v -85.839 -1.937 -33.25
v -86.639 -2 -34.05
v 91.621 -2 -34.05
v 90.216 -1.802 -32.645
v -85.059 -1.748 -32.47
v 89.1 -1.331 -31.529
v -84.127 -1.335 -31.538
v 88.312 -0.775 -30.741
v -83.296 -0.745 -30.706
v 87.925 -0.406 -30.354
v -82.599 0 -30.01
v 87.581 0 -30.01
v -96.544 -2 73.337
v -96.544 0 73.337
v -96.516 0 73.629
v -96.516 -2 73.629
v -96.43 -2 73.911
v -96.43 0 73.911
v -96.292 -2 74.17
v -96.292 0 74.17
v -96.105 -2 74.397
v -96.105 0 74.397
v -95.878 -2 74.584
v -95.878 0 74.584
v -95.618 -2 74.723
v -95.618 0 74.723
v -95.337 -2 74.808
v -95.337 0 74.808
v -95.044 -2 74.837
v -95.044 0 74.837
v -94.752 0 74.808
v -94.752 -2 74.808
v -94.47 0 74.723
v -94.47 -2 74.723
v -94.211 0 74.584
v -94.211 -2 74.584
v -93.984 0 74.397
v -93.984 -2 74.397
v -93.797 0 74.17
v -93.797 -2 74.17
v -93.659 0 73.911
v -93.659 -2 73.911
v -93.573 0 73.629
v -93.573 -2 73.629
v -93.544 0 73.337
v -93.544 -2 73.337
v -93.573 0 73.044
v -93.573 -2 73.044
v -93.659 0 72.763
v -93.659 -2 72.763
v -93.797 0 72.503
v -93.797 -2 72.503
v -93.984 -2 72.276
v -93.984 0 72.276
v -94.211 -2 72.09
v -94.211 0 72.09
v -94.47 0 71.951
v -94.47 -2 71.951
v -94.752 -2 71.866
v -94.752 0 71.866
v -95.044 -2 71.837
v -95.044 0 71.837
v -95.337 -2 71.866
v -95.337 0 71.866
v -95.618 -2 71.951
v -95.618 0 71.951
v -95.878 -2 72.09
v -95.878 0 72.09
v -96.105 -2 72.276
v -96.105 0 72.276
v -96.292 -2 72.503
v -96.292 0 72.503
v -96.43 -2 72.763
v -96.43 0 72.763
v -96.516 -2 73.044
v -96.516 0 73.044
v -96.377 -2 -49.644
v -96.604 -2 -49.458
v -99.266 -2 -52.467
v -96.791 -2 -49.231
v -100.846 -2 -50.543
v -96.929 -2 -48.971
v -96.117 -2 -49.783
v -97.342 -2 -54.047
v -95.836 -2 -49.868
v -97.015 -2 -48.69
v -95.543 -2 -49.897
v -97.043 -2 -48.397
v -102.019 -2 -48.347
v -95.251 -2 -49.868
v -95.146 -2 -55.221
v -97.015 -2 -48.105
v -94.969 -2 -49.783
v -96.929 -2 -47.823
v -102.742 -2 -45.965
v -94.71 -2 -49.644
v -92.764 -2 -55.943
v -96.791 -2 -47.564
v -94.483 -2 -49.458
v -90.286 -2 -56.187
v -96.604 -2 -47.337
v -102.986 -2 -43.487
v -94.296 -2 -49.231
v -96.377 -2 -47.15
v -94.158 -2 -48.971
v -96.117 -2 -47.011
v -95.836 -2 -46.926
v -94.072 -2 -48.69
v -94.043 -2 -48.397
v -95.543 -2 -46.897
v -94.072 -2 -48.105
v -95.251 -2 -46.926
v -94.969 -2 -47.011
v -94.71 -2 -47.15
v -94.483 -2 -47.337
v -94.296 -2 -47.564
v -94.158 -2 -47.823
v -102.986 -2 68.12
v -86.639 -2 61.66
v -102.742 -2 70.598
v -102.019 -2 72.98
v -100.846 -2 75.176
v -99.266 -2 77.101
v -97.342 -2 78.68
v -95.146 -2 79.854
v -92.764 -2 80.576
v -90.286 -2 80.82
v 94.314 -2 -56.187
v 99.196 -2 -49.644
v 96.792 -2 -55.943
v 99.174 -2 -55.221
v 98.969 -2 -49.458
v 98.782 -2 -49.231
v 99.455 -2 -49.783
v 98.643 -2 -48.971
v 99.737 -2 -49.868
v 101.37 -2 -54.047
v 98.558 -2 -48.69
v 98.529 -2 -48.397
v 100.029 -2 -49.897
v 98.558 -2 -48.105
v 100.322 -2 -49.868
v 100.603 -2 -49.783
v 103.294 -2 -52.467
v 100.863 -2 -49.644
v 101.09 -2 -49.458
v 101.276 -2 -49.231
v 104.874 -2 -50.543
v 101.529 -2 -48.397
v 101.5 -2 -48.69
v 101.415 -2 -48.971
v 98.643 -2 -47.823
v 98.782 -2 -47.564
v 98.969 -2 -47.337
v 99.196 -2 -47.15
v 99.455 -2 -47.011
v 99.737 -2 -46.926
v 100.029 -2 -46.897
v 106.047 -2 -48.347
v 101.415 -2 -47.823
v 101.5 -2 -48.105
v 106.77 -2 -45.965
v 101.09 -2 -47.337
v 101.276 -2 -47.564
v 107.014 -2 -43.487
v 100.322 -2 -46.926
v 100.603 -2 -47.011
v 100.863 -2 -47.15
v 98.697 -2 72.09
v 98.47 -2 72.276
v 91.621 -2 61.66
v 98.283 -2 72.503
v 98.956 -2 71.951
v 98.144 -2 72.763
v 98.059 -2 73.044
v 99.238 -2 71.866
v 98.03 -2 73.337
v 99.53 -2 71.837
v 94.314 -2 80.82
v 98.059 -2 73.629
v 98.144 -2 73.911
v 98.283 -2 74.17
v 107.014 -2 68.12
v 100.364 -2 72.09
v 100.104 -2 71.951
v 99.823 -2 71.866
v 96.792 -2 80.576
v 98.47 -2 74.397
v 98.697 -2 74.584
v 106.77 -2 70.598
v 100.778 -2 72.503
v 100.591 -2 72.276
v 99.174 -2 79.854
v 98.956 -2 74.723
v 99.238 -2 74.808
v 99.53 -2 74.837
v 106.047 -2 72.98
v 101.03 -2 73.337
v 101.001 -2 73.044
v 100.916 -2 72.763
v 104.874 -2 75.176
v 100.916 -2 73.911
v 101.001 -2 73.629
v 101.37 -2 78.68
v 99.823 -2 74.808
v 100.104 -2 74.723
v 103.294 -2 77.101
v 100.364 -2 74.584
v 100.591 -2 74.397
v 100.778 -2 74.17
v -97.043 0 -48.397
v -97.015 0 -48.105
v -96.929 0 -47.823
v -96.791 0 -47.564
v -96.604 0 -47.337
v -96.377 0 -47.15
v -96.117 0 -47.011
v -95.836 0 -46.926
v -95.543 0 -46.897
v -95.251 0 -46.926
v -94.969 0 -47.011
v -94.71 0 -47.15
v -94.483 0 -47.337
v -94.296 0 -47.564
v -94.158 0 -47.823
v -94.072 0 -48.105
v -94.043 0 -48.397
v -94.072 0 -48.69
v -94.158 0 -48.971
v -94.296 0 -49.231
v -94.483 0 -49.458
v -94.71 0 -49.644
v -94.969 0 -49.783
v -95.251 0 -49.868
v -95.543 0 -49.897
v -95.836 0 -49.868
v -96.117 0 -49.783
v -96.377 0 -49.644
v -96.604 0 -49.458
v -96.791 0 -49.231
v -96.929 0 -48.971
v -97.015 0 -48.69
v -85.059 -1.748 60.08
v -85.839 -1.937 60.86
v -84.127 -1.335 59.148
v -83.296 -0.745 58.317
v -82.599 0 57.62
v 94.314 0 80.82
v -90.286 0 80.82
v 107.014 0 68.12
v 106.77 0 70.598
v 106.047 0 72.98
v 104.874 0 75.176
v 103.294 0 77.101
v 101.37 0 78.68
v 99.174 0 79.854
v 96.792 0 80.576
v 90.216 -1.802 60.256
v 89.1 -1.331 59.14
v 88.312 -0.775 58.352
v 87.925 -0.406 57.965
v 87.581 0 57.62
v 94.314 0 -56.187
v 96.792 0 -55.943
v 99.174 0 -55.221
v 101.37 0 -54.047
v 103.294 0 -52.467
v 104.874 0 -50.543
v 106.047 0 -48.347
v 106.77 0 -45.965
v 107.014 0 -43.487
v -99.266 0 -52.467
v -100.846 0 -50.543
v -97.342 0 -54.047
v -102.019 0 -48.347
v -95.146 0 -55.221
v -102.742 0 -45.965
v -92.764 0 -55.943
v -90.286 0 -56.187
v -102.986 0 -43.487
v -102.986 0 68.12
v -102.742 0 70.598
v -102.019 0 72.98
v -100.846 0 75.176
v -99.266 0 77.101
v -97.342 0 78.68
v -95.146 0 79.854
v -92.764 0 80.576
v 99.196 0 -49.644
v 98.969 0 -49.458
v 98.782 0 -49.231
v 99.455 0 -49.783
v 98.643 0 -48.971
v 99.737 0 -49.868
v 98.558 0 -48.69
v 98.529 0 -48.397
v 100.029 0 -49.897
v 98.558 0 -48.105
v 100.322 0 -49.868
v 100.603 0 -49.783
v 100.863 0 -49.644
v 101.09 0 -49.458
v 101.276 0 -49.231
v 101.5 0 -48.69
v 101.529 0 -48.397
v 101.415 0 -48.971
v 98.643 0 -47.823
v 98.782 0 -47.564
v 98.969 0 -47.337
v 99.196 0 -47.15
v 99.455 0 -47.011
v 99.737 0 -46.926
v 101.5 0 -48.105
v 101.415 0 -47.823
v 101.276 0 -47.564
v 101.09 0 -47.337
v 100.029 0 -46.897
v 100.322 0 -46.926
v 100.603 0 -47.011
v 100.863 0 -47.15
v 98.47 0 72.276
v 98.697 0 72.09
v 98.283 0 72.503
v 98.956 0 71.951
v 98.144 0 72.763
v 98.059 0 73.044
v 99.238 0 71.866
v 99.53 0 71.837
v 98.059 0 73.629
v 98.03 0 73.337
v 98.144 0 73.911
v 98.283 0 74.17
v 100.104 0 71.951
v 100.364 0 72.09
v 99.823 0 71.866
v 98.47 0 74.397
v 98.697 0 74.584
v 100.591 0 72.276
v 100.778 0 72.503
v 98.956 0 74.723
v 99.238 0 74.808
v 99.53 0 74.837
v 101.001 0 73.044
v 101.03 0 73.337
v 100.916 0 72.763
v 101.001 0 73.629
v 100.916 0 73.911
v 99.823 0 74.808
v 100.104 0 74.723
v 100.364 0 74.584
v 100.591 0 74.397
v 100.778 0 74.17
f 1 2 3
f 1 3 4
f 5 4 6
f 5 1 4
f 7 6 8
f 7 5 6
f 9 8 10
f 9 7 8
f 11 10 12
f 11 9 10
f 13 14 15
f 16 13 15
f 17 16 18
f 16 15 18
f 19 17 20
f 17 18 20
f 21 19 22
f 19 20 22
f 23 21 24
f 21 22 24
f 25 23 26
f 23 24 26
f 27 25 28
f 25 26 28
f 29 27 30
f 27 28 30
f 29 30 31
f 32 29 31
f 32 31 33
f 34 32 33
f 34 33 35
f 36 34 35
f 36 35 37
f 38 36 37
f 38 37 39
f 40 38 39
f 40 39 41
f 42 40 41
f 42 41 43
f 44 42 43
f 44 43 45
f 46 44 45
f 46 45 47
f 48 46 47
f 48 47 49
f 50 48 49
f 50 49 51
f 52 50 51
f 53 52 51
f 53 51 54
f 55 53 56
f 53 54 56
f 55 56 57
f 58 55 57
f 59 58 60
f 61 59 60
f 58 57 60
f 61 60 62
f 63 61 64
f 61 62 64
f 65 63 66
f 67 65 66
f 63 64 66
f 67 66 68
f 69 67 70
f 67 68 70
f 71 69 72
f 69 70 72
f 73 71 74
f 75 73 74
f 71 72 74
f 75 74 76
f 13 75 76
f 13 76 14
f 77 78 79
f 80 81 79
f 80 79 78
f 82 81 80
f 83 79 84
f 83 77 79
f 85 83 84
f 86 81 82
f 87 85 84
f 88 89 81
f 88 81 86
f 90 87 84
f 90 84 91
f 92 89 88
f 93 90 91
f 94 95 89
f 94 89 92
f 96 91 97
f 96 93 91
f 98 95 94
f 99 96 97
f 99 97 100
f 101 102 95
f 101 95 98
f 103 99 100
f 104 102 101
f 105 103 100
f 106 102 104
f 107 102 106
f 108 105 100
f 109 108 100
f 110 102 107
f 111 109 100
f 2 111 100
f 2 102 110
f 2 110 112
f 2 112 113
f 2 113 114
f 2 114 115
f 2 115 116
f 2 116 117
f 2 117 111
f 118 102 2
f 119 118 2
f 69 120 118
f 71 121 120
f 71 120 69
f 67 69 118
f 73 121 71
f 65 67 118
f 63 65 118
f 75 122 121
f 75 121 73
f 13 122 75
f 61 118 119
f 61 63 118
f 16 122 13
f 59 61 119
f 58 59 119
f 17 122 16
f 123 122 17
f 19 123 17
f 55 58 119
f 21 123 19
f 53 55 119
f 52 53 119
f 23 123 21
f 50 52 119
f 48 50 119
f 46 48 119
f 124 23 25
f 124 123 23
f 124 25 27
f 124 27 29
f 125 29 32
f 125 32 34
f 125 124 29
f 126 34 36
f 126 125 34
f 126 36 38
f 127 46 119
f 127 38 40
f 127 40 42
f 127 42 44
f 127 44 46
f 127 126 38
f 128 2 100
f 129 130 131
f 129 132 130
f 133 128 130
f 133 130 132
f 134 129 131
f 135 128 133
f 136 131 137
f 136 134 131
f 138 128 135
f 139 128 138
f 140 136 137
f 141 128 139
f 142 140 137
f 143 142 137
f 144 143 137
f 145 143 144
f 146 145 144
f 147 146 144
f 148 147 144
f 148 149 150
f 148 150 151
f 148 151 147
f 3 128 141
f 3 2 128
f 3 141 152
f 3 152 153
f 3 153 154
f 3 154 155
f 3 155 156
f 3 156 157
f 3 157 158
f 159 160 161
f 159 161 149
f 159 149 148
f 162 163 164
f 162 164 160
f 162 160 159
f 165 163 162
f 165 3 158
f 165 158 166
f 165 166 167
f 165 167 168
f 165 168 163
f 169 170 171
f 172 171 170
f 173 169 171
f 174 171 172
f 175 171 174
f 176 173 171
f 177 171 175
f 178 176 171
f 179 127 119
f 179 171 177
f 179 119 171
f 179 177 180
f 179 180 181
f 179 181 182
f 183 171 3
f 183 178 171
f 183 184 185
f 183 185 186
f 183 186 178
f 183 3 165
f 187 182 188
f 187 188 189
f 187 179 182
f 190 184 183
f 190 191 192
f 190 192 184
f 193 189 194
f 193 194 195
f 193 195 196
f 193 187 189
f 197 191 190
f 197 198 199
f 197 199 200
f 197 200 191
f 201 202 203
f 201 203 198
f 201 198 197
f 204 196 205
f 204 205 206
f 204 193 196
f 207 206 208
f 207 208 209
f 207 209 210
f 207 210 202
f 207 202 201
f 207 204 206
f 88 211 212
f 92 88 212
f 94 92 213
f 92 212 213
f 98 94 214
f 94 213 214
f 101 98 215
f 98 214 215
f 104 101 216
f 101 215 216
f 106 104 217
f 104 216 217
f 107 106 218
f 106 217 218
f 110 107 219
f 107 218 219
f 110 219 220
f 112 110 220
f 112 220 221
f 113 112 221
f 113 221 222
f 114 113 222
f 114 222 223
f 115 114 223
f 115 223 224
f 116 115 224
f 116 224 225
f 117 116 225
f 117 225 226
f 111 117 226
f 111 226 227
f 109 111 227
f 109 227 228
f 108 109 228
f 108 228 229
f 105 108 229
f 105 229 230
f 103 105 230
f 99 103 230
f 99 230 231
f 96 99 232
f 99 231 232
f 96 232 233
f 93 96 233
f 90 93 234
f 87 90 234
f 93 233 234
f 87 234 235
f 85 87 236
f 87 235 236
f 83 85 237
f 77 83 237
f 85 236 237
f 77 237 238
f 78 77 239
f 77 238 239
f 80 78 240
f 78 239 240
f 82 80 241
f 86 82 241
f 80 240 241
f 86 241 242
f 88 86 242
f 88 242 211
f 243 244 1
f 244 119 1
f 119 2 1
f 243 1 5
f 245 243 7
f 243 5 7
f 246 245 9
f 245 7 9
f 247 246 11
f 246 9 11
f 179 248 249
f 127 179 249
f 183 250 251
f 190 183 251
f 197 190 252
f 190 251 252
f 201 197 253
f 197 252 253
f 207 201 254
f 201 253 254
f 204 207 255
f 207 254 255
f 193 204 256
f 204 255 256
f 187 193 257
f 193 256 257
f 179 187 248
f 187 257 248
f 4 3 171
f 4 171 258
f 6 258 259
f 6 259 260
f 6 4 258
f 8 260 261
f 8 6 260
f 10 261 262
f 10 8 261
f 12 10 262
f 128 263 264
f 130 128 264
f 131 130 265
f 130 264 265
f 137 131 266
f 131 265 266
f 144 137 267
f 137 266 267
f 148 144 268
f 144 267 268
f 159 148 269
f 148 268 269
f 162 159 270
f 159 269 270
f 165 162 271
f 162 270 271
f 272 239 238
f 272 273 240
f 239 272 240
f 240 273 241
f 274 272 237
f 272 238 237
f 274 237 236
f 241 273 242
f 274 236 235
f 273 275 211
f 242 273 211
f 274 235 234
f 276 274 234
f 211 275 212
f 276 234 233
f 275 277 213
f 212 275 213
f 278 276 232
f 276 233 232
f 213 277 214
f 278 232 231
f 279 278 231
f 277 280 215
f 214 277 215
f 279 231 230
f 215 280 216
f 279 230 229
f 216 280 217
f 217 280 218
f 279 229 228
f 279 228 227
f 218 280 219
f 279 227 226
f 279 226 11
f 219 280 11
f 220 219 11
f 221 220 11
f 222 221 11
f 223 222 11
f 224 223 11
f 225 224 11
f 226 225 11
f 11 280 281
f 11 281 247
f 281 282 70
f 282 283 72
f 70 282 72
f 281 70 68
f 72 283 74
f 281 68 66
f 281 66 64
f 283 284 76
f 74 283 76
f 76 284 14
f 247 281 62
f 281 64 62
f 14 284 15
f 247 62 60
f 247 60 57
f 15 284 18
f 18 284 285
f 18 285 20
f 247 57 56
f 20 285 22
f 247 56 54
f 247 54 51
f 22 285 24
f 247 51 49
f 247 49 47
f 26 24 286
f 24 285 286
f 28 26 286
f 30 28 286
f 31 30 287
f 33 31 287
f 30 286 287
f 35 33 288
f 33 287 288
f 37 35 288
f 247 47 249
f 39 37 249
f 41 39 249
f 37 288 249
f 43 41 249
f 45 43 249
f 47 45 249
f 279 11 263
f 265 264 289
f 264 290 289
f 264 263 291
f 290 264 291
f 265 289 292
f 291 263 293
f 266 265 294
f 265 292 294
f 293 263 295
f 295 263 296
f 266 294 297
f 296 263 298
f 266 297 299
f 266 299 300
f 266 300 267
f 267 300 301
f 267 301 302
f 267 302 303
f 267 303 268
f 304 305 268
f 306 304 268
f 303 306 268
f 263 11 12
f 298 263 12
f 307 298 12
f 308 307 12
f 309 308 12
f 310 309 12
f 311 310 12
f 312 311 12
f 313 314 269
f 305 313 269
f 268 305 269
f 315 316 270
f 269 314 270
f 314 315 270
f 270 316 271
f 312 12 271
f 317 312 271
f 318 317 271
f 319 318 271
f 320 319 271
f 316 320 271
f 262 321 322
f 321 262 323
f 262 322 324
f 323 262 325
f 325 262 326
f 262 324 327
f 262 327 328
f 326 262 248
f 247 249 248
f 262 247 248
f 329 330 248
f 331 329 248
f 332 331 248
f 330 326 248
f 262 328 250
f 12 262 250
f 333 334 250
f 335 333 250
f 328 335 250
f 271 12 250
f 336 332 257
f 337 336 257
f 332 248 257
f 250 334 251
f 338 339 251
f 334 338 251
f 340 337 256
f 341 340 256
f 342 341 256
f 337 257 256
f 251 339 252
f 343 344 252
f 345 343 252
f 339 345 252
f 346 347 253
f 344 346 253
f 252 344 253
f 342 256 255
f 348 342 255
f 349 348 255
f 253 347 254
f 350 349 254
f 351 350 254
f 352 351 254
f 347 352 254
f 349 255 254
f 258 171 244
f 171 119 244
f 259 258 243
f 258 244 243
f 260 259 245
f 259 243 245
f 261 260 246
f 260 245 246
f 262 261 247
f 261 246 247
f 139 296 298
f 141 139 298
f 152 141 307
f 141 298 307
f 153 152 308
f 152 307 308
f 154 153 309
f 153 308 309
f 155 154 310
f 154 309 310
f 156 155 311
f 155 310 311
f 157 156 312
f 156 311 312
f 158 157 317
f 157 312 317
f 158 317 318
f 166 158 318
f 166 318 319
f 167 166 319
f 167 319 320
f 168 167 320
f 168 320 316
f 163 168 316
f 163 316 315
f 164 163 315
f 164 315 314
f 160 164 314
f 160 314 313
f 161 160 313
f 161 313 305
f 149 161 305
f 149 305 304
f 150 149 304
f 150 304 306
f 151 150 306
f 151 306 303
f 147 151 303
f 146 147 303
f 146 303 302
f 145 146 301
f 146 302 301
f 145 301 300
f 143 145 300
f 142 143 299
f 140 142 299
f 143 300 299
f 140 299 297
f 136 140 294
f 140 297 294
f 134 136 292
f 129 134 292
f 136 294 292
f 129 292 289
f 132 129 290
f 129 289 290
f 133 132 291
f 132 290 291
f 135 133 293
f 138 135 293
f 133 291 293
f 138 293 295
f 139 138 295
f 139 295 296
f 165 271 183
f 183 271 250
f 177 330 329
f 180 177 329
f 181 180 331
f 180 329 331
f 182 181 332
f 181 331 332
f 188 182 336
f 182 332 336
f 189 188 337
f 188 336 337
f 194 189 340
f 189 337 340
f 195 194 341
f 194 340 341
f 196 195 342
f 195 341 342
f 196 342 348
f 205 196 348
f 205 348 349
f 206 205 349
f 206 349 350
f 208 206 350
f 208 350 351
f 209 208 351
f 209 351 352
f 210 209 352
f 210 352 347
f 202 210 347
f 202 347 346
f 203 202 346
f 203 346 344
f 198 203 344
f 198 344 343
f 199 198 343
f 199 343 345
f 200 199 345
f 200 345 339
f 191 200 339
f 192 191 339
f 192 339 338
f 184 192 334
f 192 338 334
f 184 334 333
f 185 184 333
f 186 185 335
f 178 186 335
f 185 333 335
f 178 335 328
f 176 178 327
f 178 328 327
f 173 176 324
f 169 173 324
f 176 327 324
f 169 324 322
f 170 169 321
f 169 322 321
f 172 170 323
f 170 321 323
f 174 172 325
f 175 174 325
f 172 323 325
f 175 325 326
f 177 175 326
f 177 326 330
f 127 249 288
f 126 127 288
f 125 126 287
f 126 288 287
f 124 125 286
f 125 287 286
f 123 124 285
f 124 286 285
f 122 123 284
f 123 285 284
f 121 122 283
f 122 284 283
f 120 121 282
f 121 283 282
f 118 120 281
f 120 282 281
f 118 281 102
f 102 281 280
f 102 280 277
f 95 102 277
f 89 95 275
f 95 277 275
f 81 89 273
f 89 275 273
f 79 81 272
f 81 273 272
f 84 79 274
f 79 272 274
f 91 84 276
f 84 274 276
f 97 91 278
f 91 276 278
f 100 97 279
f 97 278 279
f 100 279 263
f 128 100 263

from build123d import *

# Parameters (mm, degrees)
F0_W         = 170.18
F0_H         = 87.63
F1_DEPTH     = 2
F3_D         = 3
F4_T1_DEPTH  = 87.63
F4_T3_DEPTH  = 170.18
F4_T9_DEPTH  = 97.7295049384
F4_T13_DEPTH = 180.2795049384
F4_T20_DEPTH = 97.7295049384
F4_T24_DEPTH = 180.2795049384
F4_T31_DEPTH = 180.2795049384
F4_T35_DEPTH = 97.7295049384
F4_T42_DEPTH = 180.2795049384
F4_T46_DEPTH = 97.7295049384


# Not quite as in the source:
# - a fillet or chamfer that OpenCascade refuses, or shapes differently, is made with other operations: its cross-section is extruded or revolved along the edge and cut away or added


with BuildPart() as f1:
    # F0 (on Front) → F1 (new body)
    with BuildSketch(Plane.XZ):
        with BuildLine():
            Line((94.3139557123, 80.8203592896), (-90.2860442877, 80.8203592896))
            ThreePointArc((-90.2860442877, 80.8203592896), (-99.2663004088, 77.1006154107), (-102.9860442877, 68.1203592896))
            Line((-102.9860442877, 68.1203592896), (-102.9860442877, -43.4872407104))
            ThreePointArc((-102.9860442877, -43.4872407104), (-99.2663004088, -52.4674968314), (-90.2860442877, -56.1872407104))
            Line((-90.2860442877, -56.1872407104), (94.3139557123, -56.1872407104))
            ThreePointArc((94.3139557123, -56.1872407104), (103.2942118334, -52.4674968314), (107.0139557123, -43.4872407104))
            Line((107.0139557123, -43.4872407104), (107.0139557123, 68.1203592896))
            ThreePointArc((107.0139557123, 68.1203592896), (103.2942118334, 77.1006154107), (94.3139557123, 80.8203592896))
        make_face()
        with Locations((2.4907932702, 13.8051814874)):
            Rectangle(F0_W, F0_H, mode=Mode.SUBTRACT)
    extrude(amount=F1_DEPTH)

    # F3 (through all)
    with Locations(Plane.XZ.offset(2)):
        with Locations((-95.5433249474, -48.3972094953), (-95.0444117188, 73.3367204666), (100.0292077661, -48.3972094953), (99.5303019881, 73.3367204666)):
            Hole(F3_D / 2)

    # F4: fillet of radius 5.08 on 4 edges, made by hand

    # F4_s2 → F4_t1 (cut)
    with BuildSketch(Plane.XY.offset(-30.0098185126)):
        with BuildLine():
            ThreePointArc((91.6205952456, -2), (89.3667097117, -1.4726256161), (87.5807932702, 0))
            Line((87.5807932702, 0), (87.5807932702, -2))
            Line((87.5807932702, -2), (91.6205952456, -2))
        make_face()
        with BuildLine():
            ThreePointArc((-86.6390087051, -2), (-84.3851231712, -1.4726256161), (-82.5992067298, 0))
            Line((-82.5992067298, 0), (-82.5992067298, -2))
            Line((-82.5992067298, -2), (-86.6390087051, -2))
        make_face()
    extrude(amount=F4_T1_DEPTH, mode=Mode.SUBTRACT)

    # F4_s4 → F4_t3 (cut)
    with BuildSketch(Plane.YZ.offset(-82.5992067298)):
        with BuildLine():
            ThreePointArc((-2, 61.6599834627), (-1.4726256161, 59.4060979288), (0, 57.6201814874))
            Line((0, 57.6201814874), (-2, 57.6201814874))
            Line((-2, 57.6201814874), (-2, 61.6599834627))
        make_face()
        with BuildLine():
            ThreePointArc((-2, -34.049620488), (-1.4726256161, -31.795734954), (0, -30.0098185126))
            Line((0, -30.0098185126), (-2, -30.0098185126))
            Line((-2, -30.0098185126), (-2, -34.049620488))
        make_face()
    extrude(amount=F4_T3_DEPTH, mode=Mode.SUBTRACT)


with BuildPart() as f4_tool7:
    # F4_s8 → F4_t9 (new body)
    with BuildSketch(Plane.XY.offset(67.7196864257)):
        with BuildLine():
            ThreePointArc((91.6205952456, -2), (89.3667097117, -1.4726256161), (87.5807932702, 0))
            Line((87.5807932702, 0), (87.5807932702, -2))
            Line((87.5807932702, -2), (91.6205952456, -2))
        make_face()
    extrude(amount=-F4_T9_DEPTH)

    split(bisect_by=Plane.XY.offset(57.6201814874), keep=Keep.TOP)


with BuildPart() as f4_tool11:
    # F4_s12 → F4_t13 (new body)
    with BuildSketch(Plane.YZ.offset(-82.5992067298)):
        with BuildLine():
            ThreePointArc((-2, 61.6599834627), (-1.4726256161, 59.4060979288), (0, 57.6201814874))
            Line((0, 57.6201814874), (-2, 57.6201814874))
            Line((-2, 57.6201814874), (-2, 61.6599834627))
        make_face()
    extrude(amount=F4_T13_DEPTH)

    split(bisect_by=Plane.YZ.offset(87.5807932702), keep=Keep.TOP)


with BuildPart() as f4_tool7_1:
    add(f4_tool7.part)

    # F4_t15: intersect F4_tool11
    add(f4_tool11.part, mode=Mode.INTERSECT)


with BuildPart() as f1_1:
    add(f1.part)

    # F4_t5: cut F4_tool7
    add(f4_tool7_1.part, mode=Mode.SUBTRACT)


with BuildPart() as f4_tool18:
    # F4_s19 → F4_t20 (new body)
    with BuildSketch(Plane.XY.offset(57.6201814874)):
        with BuildLine():
            ThreePointArc((91.6205952456, -2), (89.3667097117, -1.4726256161), (87.5807932702, 0))
            Line((87.5807932702, 0), (87.5807932702, -2))
            Line((87.5807932702, -2), (91.6205952456, -2))
        make_face()
    extrude(amount=-F4_T20_DEPTH)

    split(bisect_by=Plane.XY.offset(-30.0098185126), keep=Keep.BOTTOM)


with BuildPart() as f4_tool22:
    # F4_s23 → F4_t24 (new body)
    with BuildSketch(Plane.YZ.offset(97.6802982086)):
        with BuildLine():
            ThreePointArc((-2, -34.049620488), (-1.4726256161, -31.795734954), (0, -30.0098185126))
            Line((0, -30.0098185126), (-2, -30.0098185126))
            Line((-2, -30.0098185126), (-2, -34.049620488))
        make_face()
    extrude(amount=-F4_T24_DEPTH)

    split(bisect_by=Plane.YZ.offset(87.5807932702), keep=Keep.TOP)


with BuildPart() as f4_tool18_1:
    add(f4_tool18.part)

    # F4_t26: intersect F4_tool22
    add(f4_tool22.part, mode=Mode.INTERSECT)


with BuildPart() as f1_2:
    add(f1_1.part)

    # F4_t16: cut F4_tool18
    add(f4_tool18_1.part, mode=Mode.SUBTRACT)


with BuildPart() as f4_tool29:
    # F4_s30 → F4_t31 (new body)
    with BuildSketch(Plane.YZ.offset(-92.6987116681)):
        with BuildLine():
            ThreePointArc((-2, 61.6599834627), (-1.4726256161, 59.4060979288), (0, 57.6201814874))
            Line((0, 57.6201814874), (-2, 57.6201814874))
            Line((-2, 57.6201814874), (-2, 61.6599834627))
        make_face()
    extrude(amount=F4_T31_DEPTH)

    split(bisect_by=Plane.YZ.offset(-82.5992067298), keep=Keep.BOTTOM)


with BuildPart() as f4_tool33:
    # F4_s34 → F4_t35 (new body)
    with BuildSketch(Plane.XY.offset(-30.0098185126)):
        with BuildLine():
            ThreePointArc((-86.6390087051, -2), (-84.3851231712, -1.4726256161), (-82.5992067298, 0))
            Line((-82.5992067298, 0), (-82.5992067298, -2))
            Line((-82.5992067298, -2), (-86.6390087051, -2))
        make_face()
    extrude(amount=F4_T35_DEPTH)

    split(bisect_by=Plane.XY.offset(57.6201814874), keep=Keep.TOP)


with BuildPart() as f4_tool29_1:
    add(f4_tool29.part)

    # F4_t37: intersect F4_tool33
    add(f4_tool33.part, mode=Mode.INTERSECT)


with BuildPart() as f1_3:
    add(f1_2.part)

    # F4_t27: cut F4_tool29
    add(f4_tool29_1.part, mode=Mode.SUBTRACT)


with BuildPart() as f4_tool40:
    # F4_s41 → F4_t42 (new body)
    with BuildSketch(Plane.YZ.offset(87.5807932702)):
        with BuildLine():
            ThreePointArc((-2, -34.049620488), (-1.4726256161, -31.795734954), (0, -30.0098185126))
            Line((0, -30.0098185126), (-2, -30.0098185126))
            Line((-2, -30.0098185126), (-2, -34.049620488))
        make_face()
    extrude(amount=-F4_T42_DEPTH)

    split(bisect_by=Plane.YZ.offset(-82.5992067298), keep=Keep.BOTTOM)


with BuildPart() as f4_tool44:
    # F4_s45 → F4_t46 (new body)
    with BuildSketch(Plane.XY.offset(-40.109323451)):
        with BuildLine():
            ThreePointArc((-86.6390087051, -2), (-84.3851231712, -1.4726256161), (-82.5992067298, 0))
            Line((-82.5992067298, 0), (-82.5992067298, -2))
            Line((-82.5992067298, -2), (-86.6390087051, -2))
        make_face()
    extrude(amount=F4_T46_DEPTH)

    split(bisect_by=Plane.XY.offset(-30.0098185126), keep=Keep.BOTTOM)


with BuildPart() as f4_tool40_1:
    add(f4_tool40.part)

    # F4_t48: intersect F4_tool44
    add(f4_tool44.part, mode=Mode.INTERSECT)


with BuildPart() as f1_4:
    add(f1_3.part)

    # F4_t38: cut F4_tool40
    add(f4_tool40_1.part, mode=Mode.SUBTRACT)


solid = f1_4.part
